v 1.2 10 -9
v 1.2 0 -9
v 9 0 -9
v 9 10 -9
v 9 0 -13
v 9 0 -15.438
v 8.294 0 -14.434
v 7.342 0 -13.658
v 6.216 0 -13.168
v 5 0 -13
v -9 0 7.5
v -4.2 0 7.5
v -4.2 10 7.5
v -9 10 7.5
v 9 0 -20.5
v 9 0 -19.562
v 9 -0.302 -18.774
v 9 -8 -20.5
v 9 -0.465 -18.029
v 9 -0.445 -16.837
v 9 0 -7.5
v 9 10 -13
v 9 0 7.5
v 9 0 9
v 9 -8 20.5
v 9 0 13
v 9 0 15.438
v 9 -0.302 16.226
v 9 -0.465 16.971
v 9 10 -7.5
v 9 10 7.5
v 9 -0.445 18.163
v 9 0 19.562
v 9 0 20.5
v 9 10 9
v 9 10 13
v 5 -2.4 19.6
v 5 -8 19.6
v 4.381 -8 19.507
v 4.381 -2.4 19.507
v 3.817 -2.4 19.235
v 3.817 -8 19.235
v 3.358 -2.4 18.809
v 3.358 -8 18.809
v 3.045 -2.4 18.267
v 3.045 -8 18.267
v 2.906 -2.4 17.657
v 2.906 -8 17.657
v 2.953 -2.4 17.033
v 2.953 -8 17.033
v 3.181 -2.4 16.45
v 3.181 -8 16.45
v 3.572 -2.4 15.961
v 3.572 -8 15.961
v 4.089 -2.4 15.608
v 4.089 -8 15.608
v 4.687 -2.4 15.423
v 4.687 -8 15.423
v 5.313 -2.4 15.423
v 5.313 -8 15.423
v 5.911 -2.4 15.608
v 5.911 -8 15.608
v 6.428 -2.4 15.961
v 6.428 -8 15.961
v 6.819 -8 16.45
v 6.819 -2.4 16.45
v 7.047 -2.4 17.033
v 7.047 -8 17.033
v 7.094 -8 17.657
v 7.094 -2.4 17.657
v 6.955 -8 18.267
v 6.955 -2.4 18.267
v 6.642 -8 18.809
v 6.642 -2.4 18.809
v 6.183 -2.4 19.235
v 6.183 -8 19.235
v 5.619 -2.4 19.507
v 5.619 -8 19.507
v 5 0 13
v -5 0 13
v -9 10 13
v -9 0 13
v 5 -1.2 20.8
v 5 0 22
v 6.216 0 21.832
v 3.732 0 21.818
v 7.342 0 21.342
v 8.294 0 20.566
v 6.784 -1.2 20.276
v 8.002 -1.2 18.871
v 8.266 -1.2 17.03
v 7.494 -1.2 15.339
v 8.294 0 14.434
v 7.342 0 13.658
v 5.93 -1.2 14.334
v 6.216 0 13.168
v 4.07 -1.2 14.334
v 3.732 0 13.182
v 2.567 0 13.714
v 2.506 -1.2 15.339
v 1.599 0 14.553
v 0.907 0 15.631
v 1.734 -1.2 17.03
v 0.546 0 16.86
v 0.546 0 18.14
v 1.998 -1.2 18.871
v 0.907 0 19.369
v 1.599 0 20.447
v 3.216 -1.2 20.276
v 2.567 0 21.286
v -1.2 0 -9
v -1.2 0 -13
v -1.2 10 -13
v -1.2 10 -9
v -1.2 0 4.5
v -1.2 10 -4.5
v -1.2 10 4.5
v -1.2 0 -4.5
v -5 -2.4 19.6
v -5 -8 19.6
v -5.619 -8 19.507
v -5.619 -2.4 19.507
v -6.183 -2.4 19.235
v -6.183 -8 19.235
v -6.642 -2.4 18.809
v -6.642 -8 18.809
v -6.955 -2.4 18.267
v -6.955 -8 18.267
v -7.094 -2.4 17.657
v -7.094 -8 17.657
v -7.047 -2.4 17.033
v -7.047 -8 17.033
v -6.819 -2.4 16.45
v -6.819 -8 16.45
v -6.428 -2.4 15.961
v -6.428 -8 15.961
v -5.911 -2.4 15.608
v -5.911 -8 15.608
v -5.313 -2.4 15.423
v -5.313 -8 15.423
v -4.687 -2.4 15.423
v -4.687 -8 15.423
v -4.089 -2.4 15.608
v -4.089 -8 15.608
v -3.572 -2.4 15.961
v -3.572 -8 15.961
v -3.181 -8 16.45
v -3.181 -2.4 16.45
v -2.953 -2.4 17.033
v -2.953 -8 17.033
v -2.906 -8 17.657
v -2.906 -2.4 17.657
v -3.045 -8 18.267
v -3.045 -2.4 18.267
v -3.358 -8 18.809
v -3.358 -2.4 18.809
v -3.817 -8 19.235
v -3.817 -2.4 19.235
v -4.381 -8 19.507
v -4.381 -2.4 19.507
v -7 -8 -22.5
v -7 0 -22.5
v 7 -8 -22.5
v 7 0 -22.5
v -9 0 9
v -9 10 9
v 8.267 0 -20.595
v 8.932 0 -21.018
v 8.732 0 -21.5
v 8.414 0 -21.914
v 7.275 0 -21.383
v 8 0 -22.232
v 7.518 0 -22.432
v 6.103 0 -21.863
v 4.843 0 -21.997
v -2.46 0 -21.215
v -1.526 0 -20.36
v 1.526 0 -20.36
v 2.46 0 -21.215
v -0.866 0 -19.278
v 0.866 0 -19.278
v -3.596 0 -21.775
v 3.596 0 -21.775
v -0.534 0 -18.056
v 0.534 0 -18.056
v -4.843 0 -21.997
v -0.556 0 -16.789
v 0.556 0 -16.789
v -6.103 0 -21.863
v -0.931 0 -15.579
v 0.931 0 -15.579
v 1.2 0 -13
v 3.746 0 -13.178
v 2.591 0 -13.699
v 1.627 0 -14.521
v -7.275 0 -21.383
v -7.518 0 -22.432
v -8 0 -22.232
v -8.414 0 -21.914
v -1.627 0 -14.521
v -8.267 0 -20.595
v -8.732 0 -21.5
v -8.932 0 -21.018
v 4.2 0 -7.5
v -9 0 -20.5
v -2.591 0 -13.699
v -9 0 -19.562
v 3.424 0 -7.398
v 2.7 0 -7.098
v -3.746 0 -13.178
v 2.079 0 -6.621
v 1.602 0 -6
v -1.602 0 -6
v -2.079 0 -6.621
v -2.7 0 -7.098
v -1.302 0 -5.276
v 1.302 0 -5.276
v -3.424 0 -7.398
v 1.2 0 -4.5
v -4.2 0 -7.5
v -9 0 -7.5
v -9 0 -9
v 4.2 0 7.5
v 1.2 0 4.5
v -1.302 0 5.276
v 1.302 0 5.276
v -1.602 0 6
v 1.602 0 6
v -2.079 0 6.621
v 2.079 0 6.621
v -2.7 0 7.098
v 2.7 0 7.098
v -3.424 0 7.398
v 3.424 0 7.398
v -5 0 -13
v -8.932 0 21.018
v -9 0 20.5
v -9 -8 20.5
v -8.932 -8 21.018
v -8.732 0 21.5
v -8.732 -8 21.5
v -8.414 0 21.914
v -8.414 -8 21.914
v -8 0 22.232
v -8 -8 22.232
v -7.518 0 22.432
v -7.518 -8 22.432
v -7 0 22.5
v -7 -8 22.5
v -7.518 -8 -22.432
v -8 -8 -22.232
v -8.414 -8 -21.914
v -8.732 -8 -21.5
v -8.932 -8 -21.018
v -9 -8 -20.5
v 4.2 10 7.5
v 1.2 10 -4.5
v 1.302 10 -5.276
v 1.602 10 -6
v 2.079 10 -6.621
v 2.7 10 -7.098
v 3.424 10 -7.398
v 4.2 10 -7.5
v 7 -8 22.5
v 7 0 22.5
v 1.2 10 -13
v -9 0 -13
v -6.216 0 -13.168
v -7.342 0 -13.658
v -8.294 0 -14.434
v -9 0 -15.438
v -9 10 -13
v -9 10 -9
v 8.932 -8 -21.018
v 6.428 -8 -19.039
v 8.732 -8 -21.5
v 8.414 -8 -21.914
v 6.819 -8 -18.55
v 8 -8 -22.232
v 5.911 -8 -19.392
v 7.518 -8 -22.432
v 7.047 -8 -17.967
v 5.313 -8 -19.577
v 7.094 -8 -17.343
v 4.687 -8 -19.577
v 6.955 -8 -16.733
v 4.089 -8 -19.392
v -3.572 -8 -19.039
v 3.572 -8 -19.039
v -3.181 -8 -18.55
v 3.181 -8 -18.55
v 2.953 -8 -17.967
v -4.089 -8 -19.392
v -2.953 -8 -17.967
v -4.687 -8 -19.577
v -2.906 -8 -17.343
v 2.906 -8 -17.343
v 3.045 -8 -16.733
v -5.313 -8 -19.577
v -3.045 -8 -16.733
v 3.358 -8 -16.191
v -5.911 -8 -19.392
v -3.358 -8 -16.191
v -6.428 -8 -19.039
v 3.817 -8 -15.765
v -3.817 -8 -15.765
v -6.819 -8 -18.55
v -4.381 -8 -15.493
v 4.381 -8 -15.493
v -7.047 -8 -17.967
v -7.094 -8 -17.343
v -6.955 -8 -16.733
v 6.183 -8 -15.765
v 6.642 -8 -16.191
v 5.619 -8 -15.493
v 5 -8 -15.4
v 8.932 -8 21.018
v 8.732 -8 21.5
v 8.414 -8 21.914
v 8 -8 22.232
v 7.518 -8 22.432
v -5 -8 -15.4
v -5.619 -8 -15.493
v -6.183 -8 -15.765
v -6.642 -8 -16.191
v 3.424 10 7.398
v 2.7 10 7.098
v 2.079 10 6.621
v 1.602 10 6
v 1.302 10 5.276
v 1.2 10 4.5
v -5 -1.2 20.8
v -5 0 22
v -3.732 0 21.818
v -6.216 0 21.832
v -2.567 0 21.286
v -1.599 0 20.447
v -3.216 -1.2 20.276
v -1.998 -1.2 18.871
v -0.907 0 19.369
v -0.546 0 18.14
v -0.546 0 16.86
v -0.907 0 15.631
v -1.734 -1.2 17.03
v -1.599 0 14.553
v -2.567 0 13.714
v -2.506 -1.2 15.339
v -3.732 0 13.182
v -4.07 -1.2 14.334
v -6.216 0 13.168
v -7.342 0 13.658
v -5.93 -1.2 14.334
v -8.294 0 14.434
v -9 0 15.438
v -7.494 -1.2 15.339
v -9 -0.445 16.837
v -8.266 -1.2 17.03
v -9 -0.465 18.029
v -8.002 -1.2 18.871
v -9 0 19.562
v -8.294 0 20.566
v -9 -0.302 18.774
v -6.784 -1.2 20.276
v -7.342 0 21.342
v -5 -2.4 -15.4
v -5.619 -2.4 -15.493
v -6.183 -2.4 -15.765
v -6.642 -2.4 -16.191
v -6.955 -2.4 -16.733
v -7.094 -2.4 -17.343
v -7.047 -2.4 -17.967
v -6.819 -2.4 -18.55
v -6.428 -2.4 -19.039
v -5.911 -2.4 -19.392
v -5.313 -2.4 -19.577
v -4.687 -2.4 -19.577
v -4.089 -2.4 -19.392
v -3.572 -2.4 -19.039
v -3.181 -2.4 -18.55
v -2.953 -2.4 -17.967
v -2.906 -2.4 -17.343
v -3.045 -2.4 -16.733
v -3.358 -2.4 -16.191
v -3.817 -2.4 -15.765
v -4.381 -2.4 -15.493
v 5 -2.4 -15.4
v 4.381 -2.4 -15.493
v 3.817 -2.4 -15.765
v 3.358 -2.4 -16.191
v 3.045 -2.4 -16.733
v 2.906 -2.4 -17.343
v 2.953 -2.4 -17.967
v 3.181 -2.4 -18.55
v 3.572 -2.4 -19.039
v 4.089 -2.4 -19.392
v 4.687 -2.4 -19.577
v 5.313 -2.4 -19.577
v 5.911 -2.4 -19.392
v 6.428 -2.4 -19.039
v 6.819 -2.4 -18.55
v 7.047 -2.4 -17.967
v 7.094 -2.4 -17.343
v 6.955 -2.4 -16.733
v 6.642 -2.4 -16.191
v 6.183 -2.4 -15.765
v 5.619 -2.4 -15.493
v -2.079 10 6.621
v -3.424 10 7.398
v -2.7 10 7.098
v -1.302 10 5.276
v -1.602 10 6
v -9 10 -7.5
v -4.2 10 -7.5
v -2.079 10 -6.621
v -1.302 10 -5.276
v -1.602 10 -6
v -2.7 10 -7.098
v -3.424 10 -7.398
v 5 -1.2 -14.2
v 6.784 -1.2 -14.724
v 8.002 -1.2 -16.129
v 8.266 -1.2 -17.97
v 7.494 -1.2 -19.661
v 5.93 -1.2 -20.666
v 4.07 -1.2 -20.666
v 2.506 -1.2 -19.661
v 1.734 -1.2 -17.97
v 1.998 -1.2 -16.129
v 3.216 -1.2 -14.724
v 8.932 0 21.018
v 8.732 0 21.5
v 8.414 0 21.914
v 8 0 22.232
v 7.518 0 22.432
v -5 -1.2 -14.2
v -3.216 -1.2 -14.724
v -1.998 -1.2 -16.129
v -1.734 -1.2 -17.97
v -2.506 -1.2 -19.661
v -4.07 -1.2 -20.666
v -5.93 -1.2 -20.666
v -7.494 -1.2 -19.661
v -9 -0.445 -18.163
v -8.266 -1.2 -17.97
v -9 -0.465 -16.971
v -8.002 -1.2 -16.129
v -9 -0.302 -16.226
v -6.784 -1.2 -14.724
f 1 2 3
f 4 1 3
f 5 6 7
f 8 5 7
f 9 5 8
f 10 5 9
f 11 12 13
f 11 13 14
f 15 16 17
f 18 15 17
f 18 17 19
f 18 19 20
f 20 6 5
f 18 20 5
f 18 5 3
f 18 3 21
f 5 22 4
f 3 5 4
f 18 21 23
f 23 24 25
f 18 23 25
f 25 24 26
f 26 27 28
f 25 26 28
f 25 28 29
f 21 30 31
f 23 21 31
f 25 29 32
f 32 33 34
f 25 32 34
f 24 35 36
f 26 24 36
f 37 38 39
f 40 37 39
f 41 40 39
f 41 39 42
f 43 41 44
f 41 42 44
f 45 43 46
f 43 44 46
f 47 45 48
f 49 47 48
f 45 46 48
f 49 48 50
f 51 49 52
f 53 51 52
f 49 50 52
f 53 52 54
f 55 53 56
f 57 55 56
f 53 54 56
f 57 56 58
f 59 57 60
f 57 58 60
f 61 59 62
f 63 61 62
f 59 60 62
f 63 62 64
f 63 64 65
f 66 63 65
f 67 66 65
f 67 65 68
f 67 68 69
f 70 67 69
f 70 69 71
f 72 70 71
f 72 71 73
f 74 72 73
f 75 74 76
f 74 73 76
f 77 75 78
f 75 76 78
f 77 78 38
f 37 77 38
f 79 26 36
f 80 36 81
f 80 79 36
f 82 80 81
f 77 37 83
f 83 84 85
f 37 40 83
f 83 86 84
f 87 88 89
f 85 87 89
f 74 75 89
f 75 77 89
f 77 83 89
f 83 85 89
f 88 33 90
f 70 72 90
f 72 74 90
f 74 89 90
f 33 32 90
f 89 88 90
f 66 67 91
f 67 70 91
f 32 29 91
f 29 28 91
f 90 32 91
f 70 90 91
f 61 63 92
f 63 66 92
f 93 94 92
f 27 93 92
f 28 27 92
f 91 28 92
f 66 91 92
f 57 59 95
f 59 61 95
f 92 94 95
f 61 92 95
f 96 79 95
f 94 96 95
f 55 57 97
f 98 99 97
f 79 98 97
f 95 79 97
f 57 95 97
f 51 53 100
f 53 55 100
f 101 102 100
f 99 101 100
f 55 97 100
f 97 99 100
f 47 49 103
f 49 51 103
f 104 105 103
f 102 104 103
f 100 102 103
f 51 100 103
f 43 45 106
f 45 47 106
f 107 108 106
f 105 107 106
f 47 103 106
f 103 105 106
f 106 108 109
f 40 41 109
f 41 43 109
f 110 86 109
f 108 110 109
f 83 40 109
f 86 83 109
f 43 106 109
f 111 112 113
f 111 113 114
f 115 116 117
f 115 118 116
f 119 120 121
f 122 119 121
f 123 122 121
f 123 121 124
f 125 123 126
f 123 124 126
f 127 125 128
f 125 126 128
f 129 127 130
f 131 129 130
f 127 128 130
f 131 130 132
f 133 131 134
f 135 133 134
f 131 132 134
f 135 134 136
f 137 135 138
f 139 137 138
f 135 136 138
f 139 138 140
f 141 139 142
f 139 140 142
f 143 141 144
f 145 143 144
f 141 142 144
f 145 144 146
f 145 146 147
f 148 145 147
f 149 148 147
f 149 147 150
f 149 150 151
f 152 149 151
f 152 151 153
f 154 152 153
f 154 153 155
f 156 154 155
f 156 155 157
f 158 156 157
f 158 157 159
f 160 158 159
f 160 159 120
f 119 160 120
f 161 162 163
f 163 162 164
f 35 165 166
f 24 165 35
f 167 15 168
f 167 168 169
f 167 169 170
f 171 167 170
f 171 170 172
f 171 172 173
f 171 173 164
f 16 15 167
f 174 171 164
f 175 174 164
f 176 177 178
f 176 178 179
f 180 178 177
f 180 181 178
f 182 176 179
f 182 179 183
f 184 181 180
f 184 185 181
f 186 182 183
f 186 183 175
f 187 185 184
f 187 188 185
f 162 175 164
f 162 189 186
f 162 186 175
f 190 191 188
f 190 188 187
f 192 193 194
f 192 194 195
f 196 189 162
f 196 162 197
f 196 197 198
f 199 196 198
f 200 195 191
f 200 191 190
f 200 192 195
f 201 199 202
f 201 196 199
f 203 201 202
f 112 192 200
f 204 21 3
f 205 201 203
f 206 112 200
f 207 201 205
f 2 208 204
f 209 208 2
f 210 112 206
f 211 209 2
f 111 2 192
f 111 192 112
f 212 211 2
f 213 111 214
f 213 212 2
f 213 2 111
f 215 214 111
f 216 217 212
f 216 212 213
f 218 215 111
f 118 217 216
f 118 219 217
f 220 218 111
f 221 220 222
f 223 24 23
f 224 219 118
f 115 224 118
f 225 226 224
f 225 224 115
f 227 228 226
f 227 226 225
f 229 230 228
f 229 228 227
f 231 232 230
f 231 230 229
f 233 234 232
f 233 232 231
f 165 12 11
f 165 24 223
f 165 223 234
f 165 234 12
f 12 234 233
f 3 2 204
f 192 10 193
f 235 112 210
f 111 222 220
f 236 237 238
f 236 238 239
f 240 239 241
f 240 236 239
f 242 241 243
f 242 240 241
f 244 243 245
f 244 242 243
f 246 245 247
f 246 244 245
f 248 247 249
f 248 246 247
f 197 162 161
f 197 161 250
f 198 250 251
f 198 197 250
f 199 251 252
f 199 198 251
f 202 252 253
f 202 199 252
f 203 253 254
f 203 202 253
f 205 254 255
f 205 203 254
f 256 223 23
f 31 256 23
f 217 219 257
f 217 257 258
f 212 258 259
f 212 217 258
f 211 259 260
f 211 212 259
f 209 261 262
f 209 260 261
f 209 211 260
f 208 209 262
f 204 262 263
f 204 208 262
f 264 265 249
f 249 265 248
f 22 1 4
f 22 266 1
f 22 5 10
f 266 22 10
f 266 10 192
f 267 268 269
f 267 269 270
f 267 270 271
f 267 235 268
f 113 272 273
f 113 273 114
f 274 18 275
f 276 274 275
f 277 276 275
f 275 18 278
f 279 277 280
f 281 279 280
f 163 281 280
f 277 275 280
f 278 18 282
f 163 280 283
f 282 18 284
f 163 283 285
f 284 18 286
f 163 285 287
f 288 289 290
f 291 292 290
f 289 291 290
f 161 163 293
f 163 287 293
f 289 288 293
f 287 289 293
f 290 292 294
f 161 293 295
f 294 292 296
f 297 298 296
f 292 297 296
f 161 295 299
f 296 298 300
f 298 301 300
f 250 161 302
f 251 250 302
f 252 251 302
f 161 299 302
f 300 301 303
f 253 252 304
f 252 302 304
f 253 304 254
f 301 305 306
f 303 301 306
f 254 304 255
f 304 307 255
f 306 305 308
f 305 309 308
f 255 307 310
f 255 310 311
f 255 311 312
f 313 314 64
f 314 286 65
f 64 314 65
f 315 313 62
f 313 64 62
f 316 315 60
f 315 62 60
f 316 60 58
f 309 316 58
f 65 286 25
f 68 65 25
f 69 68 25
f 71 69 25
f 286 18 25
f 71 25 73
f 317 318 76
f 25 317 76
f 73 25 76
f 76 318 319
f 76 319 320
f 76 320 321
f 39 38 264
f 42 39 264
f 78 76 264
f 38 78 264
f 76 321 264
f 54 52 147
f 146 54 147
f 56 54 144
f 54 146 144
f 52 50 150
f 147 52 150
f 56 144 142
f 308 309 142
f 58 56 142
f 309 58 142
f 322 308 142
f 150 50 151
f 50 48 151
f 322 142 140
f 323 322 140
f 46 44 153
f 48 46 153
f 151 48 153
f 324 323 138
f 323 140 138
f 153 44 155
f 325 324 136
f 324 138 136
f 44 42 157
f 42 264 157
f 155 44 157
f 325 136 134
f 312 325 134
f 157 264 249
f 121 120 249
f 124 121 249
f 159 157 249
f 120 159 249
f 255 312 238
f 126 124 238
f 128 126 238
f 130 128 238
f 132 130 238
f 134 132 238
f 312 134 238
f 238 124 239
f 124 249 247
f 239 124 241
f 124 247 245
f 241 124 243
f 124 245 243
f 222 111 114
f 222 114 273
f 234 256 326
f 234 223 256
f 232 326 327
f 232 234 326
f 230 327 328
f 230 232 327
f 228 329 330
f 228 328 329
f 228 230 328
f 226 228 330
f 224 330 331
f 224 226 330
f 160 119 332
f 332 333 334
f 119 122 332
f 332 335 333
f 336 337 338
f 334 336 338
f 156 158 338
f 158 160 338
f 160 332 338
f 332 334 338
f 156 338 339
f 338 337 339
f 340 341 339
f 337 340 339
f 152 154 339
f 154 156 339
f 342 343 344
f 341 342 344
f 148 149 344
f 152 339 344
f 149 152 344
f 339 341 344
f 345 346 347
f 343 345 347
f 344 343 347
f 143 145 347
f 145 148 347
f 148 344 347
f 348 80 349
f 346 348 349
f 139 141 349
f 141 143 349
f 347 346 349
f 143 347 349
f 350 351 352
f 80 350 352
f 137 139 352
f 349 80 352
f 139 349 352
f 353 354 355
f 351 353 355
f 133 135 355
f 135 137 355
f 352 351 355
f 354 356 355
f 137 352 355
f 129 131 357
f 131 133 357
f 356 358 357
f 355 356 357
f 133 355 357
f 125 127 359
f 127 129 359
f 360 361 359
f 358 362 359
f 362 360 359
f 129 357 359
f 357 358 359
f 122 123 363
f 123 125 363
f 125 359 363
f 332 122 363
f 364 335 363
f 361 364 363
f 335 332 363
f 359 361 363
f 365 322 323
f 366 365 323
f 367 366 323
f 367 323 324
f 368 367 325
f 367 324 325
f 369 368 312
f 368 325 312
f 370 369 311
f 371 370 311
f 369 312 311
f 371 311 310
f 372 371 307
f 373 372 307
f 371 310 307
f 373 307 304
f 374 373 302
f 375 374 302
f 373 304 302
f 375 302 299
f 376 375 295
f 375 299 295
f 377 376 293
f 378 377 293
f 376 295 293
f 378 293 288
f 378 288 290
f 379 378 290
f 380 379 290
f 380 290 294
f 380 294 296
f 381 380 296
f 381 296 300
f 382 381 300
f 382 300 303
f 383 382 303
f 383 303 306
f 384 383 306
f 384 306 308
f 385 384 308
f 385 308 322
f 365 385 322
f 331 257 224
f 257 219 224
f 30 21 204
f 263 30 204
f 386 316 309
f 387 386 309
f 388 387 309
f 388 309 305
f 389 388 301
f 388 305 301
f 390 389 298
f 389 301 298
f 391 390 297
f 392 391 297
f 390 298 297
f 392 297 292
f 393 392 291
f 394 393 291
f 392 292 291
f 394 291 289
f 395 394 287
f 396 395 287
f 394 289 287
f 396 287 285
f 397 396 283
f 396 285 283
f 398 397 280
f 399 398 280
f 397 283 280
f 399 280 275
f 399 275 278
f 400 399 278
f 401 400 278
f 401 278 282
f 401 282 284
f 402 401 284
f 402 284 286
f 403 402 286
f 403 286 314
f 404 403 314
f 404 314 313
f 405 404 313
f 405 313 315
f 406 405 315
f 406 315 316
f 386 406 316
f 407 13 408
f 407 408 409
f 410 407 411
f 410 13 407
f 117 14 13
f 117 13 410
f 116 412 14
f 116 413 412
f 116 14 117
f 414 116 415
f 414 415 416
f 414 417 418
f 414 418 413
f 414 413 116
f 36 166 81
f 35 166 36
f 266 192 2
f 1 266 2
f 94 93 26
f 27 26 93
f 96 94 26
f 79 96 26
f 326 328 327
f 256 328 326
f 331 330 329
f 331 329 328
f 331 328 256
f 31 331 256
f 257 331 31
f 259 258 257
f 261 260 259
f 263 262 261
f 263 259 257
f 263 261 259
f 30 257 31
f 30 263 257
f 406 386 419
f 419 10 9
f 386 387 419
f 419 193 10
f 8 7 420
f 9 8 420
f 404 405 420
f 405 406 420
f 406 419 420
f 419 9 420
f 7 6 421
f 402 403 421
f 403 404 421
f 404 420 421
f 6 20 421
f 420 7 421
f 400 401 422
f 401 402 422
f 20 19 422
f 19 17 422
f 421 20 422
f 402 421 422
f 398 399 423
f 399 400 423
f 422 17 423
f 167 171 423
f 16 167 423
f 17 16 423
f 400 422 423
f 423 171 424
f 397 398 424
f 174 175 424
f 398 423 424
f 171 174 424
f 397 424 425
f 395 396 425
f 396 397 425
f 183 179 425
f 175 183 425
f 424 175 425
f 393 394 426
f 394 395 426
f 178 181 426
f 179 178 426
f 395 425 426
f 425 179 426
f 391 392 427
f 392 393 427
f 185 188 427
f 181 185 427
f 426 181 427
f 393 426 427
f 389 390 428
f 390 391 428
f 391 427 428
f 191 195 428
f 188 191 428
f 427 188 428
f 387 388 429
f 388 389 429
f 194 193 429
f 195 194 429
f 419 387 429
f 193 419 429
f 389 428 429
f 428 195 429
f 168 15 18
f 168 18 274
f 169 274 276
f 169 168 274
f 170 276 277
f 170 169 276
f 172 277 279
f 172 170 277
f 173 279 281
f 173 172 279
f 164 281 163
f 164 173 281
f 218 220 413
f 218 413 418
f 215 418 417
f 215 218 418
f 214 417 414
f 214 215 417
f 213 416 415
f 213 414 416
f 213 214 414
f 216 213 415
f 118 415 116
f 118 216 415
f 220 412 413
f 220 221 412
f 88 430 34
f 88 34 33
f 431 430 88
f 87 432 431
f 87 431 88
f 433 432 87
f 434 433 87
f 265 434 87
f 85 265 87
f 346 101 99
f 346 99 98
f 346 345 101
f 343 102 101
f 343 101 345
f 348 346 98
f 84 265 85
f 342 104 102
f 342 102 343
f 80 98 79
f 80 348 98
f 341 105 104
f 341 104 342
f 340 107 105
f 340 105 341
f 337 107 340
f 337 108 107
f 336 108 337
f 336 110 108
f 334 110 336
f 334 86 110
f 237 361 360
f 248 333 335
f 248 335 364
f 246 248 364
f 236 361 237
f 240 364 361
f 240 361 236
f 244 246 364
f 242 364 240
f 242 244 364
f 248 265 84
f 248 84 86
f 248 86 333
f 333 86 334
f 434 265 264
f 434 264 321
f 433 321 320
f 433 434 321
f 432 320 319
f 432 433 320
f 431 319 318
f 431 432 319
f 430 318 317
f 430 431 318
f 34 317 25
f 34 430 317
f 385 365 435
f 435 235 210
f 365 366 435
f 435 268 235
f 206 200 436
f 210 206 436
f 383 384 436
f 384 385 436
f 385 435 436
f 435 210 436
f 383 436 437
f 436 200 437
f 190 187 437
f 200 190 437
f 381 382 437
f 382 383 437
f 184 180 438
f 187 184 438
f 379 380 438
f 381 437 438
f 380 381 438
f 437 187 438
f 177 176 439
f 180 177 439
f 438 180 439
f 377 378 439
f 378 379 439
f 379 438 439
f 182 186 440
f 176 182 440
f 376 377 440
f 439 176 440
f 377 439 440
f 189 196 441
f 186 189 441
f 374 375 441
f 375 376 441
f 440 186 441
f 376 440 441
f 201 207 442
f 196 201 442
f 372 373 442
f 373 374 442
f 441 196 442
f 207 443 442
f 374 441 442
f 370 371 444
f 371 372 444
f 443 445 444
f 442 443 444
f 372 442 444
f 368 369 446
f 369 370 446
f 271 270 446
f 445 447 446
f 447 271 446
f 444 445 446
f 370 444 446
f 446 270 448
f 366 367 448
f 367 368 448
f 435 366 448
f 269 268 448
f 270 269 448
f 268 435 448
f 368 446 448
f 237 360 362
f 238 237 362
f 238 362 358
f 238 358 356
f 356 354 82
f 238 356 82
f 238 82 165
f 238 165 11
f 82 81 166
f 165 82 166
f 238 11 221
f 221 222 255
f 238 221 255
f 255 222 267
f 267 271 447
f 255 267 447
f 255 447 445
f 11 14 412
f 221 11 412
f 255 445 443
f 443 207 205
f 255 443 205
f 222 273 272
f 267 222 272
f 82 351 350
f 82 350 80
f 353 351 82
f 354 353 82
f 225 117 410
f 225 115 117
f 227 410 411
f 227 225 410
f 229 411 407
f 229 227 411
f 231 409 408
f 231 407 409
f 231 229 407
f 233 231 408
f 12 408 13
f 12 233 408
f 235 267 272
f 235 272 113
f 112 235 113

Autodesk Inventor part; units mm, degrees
ref_plane "YZ Plane" through (0, 0, 0) normal (1, 0, 0) x (0, 1, 0)
ref_plane "XZ Plane" through (0, 0, 0) normal (0, 1, 0) x (-1, 0, 0)
ref_plane "XY Plane" through (0, 0, 0) normal (0, 0, 1) x (1, 0, 0)
sketch "Esquisse1" plane through (0, 0, 0) normal (0, 1, 0) x (-1, 0, 0)
  line L0 (-7, 22.5) -> (7, 22.5)
  line L1 (9, 20.5) -> (9, -20.5)
  line L2 (7, -22.5) -> (-7, -22.5)
  line L3 (-9, -20.5) -> (-9, 20.5)
  line L4 (-9, 22.5) -> (9, -22.5) construction
  line L5 (9, 22.5) -> (-9, -22.5) construction
  line L6 (-5, -17.5) -> (5, -17.5) construction
  line L7 (5, -17.5) -> (5, 17.5) construction
  line L8 (5, 17.5) -> (-5, 17.5) construction
  line L9 (-5, 17.5) -> (-5, -17.5) construction
  line L10 (-5, -17.5) -> (5, 17.5) construction
  line L11 (5, -17.5) -> (-5, 17.5) construction
  arc A0 (9, 20.5) -> (7, 22.5) centre (7, 20.5) ccw
  arc A1 (-7, 22.5) -> (-9, 20.5) centre (-7, 20.5) ccw
  arc A2 (-9, -20.5) -> (-7, -22.5) centre (-7, -20.5) ccw
  arc A3 (7, -22.5) -> (9, -20.5) centre (7, -20.5) ccw
  point P0 (0, 0)
  dimension "d0" = 18
  dimension "d1" = 45
  dimension "d3" = 4
  dimension "d4" = 5
  dimension "d25" = 2
extrude "Extrusion1" add sketch "Esquisse1" against normal blind 8
hole "Perçage1" at (-5, 0, 17.5) at (5, 0, 17.5) at (5, 0, -17.5) at (-5, 0, -17.5) direction (0, -1, 0) diameter 4.2 end through all countersink diameter 9 countersink angle 90
sketch "Esquisse2" plane through (0, 0, 0) normal (0, 1, 0) x (1, 0, 0)
  line L0 (-9, -20.5) -> (-9, 20.5) construction
  line L1 (9, 13) -> (-9, 13) construction
  line L2 (-9, 13) -> (-9, -13) construction
  line L3 (-9, -13) -> (9, -13) construction
  line L4 (9, -13) -> (9, 13) construction
  line L5 (9, 13) -> (-9, -13) construction
  line L6 (-9, 13) -> (9, -13) construction
  line L7 (9, 7.5) -> (4.2, 7.5)
  line L8 (1.2, 4.5) -> (1.2, -4.5)
  line L9 (4.2, -7.5) -> (9, -7.5)
  line L10 (9, -7.5) -> (9, 7.5)
  arc A0 (1.2, -4.5) -> (4.2, -7.5) centre (4.2, -4.5) ccw
  arc A1 (4.2, 7.5) -> (1.2, 4.5) centre (4.2, 4.5) ccw
  line L11 (9, -13) -> (-9, -13)
  line L12 (-9, -9) -> (9, -9)
  line L13 (9, -9) -> (9, -13)
  line L14 (9, 13) -> (1.2, 13)
  line L15 (1.2, 13) -> (1.2, 9)
  line L16 (1.2, 9) -> (9, 9)
  line L17 (9, 9) -> (9, 13)
  line L18 (0, -22.5) -> (0, 22.5)
  line L19 (-7, -22.5) -> (7, -22.5) construction
  line L20 (7, 22.5) -> (-7, 22.5) construction
  line L21 (-9, -13) -> (-9, 13) construction
  line L22 (-9, 7.5) -> (-4.2, 7.5)
  line L23 (-1.2, 4.5) -> (-1.2, -4.5)
  line L24 (-4.2, -7.5) -> (-9, -7.5)
  line L25 (-9, -7.5) -> (-9, 7.5)
  arc A2 (-4.2, -7.5) -> (-1.2, -4.5) centre (-4.2, -4.5) ccw
  arc A3 (-1.2, 4.5) -> (-4.2, 7.5) centre (-4.2, 4.5) ccw
  line L26 (-9, -9) -> (-9, -13)
  line L27 (-9, 13) -> (-1.2, 13)
  line L28 (-1.2, 13) -> (-1.2, 9)
  line L29 (-1.2, 9) -> (-9, 9)
  line L30 (-9, 9) -> (-9, 13)
  point P0 (0, 0)
  point P1 (-9, -22.5)
  point P2 (-9, 22.5)
  dimension "d17" = 1.5
  dimension "d19" = 15
  dimension "d20" = 4
  dimension "d21" = 3
  dimension "d22" = 4
  dimension "d23" = 1.5
  dimension "d24" = 1.2
extrude "Extrusion2" add sketch "Esquisse2" along normal blind 10
properties part number "jonction de courroie"
